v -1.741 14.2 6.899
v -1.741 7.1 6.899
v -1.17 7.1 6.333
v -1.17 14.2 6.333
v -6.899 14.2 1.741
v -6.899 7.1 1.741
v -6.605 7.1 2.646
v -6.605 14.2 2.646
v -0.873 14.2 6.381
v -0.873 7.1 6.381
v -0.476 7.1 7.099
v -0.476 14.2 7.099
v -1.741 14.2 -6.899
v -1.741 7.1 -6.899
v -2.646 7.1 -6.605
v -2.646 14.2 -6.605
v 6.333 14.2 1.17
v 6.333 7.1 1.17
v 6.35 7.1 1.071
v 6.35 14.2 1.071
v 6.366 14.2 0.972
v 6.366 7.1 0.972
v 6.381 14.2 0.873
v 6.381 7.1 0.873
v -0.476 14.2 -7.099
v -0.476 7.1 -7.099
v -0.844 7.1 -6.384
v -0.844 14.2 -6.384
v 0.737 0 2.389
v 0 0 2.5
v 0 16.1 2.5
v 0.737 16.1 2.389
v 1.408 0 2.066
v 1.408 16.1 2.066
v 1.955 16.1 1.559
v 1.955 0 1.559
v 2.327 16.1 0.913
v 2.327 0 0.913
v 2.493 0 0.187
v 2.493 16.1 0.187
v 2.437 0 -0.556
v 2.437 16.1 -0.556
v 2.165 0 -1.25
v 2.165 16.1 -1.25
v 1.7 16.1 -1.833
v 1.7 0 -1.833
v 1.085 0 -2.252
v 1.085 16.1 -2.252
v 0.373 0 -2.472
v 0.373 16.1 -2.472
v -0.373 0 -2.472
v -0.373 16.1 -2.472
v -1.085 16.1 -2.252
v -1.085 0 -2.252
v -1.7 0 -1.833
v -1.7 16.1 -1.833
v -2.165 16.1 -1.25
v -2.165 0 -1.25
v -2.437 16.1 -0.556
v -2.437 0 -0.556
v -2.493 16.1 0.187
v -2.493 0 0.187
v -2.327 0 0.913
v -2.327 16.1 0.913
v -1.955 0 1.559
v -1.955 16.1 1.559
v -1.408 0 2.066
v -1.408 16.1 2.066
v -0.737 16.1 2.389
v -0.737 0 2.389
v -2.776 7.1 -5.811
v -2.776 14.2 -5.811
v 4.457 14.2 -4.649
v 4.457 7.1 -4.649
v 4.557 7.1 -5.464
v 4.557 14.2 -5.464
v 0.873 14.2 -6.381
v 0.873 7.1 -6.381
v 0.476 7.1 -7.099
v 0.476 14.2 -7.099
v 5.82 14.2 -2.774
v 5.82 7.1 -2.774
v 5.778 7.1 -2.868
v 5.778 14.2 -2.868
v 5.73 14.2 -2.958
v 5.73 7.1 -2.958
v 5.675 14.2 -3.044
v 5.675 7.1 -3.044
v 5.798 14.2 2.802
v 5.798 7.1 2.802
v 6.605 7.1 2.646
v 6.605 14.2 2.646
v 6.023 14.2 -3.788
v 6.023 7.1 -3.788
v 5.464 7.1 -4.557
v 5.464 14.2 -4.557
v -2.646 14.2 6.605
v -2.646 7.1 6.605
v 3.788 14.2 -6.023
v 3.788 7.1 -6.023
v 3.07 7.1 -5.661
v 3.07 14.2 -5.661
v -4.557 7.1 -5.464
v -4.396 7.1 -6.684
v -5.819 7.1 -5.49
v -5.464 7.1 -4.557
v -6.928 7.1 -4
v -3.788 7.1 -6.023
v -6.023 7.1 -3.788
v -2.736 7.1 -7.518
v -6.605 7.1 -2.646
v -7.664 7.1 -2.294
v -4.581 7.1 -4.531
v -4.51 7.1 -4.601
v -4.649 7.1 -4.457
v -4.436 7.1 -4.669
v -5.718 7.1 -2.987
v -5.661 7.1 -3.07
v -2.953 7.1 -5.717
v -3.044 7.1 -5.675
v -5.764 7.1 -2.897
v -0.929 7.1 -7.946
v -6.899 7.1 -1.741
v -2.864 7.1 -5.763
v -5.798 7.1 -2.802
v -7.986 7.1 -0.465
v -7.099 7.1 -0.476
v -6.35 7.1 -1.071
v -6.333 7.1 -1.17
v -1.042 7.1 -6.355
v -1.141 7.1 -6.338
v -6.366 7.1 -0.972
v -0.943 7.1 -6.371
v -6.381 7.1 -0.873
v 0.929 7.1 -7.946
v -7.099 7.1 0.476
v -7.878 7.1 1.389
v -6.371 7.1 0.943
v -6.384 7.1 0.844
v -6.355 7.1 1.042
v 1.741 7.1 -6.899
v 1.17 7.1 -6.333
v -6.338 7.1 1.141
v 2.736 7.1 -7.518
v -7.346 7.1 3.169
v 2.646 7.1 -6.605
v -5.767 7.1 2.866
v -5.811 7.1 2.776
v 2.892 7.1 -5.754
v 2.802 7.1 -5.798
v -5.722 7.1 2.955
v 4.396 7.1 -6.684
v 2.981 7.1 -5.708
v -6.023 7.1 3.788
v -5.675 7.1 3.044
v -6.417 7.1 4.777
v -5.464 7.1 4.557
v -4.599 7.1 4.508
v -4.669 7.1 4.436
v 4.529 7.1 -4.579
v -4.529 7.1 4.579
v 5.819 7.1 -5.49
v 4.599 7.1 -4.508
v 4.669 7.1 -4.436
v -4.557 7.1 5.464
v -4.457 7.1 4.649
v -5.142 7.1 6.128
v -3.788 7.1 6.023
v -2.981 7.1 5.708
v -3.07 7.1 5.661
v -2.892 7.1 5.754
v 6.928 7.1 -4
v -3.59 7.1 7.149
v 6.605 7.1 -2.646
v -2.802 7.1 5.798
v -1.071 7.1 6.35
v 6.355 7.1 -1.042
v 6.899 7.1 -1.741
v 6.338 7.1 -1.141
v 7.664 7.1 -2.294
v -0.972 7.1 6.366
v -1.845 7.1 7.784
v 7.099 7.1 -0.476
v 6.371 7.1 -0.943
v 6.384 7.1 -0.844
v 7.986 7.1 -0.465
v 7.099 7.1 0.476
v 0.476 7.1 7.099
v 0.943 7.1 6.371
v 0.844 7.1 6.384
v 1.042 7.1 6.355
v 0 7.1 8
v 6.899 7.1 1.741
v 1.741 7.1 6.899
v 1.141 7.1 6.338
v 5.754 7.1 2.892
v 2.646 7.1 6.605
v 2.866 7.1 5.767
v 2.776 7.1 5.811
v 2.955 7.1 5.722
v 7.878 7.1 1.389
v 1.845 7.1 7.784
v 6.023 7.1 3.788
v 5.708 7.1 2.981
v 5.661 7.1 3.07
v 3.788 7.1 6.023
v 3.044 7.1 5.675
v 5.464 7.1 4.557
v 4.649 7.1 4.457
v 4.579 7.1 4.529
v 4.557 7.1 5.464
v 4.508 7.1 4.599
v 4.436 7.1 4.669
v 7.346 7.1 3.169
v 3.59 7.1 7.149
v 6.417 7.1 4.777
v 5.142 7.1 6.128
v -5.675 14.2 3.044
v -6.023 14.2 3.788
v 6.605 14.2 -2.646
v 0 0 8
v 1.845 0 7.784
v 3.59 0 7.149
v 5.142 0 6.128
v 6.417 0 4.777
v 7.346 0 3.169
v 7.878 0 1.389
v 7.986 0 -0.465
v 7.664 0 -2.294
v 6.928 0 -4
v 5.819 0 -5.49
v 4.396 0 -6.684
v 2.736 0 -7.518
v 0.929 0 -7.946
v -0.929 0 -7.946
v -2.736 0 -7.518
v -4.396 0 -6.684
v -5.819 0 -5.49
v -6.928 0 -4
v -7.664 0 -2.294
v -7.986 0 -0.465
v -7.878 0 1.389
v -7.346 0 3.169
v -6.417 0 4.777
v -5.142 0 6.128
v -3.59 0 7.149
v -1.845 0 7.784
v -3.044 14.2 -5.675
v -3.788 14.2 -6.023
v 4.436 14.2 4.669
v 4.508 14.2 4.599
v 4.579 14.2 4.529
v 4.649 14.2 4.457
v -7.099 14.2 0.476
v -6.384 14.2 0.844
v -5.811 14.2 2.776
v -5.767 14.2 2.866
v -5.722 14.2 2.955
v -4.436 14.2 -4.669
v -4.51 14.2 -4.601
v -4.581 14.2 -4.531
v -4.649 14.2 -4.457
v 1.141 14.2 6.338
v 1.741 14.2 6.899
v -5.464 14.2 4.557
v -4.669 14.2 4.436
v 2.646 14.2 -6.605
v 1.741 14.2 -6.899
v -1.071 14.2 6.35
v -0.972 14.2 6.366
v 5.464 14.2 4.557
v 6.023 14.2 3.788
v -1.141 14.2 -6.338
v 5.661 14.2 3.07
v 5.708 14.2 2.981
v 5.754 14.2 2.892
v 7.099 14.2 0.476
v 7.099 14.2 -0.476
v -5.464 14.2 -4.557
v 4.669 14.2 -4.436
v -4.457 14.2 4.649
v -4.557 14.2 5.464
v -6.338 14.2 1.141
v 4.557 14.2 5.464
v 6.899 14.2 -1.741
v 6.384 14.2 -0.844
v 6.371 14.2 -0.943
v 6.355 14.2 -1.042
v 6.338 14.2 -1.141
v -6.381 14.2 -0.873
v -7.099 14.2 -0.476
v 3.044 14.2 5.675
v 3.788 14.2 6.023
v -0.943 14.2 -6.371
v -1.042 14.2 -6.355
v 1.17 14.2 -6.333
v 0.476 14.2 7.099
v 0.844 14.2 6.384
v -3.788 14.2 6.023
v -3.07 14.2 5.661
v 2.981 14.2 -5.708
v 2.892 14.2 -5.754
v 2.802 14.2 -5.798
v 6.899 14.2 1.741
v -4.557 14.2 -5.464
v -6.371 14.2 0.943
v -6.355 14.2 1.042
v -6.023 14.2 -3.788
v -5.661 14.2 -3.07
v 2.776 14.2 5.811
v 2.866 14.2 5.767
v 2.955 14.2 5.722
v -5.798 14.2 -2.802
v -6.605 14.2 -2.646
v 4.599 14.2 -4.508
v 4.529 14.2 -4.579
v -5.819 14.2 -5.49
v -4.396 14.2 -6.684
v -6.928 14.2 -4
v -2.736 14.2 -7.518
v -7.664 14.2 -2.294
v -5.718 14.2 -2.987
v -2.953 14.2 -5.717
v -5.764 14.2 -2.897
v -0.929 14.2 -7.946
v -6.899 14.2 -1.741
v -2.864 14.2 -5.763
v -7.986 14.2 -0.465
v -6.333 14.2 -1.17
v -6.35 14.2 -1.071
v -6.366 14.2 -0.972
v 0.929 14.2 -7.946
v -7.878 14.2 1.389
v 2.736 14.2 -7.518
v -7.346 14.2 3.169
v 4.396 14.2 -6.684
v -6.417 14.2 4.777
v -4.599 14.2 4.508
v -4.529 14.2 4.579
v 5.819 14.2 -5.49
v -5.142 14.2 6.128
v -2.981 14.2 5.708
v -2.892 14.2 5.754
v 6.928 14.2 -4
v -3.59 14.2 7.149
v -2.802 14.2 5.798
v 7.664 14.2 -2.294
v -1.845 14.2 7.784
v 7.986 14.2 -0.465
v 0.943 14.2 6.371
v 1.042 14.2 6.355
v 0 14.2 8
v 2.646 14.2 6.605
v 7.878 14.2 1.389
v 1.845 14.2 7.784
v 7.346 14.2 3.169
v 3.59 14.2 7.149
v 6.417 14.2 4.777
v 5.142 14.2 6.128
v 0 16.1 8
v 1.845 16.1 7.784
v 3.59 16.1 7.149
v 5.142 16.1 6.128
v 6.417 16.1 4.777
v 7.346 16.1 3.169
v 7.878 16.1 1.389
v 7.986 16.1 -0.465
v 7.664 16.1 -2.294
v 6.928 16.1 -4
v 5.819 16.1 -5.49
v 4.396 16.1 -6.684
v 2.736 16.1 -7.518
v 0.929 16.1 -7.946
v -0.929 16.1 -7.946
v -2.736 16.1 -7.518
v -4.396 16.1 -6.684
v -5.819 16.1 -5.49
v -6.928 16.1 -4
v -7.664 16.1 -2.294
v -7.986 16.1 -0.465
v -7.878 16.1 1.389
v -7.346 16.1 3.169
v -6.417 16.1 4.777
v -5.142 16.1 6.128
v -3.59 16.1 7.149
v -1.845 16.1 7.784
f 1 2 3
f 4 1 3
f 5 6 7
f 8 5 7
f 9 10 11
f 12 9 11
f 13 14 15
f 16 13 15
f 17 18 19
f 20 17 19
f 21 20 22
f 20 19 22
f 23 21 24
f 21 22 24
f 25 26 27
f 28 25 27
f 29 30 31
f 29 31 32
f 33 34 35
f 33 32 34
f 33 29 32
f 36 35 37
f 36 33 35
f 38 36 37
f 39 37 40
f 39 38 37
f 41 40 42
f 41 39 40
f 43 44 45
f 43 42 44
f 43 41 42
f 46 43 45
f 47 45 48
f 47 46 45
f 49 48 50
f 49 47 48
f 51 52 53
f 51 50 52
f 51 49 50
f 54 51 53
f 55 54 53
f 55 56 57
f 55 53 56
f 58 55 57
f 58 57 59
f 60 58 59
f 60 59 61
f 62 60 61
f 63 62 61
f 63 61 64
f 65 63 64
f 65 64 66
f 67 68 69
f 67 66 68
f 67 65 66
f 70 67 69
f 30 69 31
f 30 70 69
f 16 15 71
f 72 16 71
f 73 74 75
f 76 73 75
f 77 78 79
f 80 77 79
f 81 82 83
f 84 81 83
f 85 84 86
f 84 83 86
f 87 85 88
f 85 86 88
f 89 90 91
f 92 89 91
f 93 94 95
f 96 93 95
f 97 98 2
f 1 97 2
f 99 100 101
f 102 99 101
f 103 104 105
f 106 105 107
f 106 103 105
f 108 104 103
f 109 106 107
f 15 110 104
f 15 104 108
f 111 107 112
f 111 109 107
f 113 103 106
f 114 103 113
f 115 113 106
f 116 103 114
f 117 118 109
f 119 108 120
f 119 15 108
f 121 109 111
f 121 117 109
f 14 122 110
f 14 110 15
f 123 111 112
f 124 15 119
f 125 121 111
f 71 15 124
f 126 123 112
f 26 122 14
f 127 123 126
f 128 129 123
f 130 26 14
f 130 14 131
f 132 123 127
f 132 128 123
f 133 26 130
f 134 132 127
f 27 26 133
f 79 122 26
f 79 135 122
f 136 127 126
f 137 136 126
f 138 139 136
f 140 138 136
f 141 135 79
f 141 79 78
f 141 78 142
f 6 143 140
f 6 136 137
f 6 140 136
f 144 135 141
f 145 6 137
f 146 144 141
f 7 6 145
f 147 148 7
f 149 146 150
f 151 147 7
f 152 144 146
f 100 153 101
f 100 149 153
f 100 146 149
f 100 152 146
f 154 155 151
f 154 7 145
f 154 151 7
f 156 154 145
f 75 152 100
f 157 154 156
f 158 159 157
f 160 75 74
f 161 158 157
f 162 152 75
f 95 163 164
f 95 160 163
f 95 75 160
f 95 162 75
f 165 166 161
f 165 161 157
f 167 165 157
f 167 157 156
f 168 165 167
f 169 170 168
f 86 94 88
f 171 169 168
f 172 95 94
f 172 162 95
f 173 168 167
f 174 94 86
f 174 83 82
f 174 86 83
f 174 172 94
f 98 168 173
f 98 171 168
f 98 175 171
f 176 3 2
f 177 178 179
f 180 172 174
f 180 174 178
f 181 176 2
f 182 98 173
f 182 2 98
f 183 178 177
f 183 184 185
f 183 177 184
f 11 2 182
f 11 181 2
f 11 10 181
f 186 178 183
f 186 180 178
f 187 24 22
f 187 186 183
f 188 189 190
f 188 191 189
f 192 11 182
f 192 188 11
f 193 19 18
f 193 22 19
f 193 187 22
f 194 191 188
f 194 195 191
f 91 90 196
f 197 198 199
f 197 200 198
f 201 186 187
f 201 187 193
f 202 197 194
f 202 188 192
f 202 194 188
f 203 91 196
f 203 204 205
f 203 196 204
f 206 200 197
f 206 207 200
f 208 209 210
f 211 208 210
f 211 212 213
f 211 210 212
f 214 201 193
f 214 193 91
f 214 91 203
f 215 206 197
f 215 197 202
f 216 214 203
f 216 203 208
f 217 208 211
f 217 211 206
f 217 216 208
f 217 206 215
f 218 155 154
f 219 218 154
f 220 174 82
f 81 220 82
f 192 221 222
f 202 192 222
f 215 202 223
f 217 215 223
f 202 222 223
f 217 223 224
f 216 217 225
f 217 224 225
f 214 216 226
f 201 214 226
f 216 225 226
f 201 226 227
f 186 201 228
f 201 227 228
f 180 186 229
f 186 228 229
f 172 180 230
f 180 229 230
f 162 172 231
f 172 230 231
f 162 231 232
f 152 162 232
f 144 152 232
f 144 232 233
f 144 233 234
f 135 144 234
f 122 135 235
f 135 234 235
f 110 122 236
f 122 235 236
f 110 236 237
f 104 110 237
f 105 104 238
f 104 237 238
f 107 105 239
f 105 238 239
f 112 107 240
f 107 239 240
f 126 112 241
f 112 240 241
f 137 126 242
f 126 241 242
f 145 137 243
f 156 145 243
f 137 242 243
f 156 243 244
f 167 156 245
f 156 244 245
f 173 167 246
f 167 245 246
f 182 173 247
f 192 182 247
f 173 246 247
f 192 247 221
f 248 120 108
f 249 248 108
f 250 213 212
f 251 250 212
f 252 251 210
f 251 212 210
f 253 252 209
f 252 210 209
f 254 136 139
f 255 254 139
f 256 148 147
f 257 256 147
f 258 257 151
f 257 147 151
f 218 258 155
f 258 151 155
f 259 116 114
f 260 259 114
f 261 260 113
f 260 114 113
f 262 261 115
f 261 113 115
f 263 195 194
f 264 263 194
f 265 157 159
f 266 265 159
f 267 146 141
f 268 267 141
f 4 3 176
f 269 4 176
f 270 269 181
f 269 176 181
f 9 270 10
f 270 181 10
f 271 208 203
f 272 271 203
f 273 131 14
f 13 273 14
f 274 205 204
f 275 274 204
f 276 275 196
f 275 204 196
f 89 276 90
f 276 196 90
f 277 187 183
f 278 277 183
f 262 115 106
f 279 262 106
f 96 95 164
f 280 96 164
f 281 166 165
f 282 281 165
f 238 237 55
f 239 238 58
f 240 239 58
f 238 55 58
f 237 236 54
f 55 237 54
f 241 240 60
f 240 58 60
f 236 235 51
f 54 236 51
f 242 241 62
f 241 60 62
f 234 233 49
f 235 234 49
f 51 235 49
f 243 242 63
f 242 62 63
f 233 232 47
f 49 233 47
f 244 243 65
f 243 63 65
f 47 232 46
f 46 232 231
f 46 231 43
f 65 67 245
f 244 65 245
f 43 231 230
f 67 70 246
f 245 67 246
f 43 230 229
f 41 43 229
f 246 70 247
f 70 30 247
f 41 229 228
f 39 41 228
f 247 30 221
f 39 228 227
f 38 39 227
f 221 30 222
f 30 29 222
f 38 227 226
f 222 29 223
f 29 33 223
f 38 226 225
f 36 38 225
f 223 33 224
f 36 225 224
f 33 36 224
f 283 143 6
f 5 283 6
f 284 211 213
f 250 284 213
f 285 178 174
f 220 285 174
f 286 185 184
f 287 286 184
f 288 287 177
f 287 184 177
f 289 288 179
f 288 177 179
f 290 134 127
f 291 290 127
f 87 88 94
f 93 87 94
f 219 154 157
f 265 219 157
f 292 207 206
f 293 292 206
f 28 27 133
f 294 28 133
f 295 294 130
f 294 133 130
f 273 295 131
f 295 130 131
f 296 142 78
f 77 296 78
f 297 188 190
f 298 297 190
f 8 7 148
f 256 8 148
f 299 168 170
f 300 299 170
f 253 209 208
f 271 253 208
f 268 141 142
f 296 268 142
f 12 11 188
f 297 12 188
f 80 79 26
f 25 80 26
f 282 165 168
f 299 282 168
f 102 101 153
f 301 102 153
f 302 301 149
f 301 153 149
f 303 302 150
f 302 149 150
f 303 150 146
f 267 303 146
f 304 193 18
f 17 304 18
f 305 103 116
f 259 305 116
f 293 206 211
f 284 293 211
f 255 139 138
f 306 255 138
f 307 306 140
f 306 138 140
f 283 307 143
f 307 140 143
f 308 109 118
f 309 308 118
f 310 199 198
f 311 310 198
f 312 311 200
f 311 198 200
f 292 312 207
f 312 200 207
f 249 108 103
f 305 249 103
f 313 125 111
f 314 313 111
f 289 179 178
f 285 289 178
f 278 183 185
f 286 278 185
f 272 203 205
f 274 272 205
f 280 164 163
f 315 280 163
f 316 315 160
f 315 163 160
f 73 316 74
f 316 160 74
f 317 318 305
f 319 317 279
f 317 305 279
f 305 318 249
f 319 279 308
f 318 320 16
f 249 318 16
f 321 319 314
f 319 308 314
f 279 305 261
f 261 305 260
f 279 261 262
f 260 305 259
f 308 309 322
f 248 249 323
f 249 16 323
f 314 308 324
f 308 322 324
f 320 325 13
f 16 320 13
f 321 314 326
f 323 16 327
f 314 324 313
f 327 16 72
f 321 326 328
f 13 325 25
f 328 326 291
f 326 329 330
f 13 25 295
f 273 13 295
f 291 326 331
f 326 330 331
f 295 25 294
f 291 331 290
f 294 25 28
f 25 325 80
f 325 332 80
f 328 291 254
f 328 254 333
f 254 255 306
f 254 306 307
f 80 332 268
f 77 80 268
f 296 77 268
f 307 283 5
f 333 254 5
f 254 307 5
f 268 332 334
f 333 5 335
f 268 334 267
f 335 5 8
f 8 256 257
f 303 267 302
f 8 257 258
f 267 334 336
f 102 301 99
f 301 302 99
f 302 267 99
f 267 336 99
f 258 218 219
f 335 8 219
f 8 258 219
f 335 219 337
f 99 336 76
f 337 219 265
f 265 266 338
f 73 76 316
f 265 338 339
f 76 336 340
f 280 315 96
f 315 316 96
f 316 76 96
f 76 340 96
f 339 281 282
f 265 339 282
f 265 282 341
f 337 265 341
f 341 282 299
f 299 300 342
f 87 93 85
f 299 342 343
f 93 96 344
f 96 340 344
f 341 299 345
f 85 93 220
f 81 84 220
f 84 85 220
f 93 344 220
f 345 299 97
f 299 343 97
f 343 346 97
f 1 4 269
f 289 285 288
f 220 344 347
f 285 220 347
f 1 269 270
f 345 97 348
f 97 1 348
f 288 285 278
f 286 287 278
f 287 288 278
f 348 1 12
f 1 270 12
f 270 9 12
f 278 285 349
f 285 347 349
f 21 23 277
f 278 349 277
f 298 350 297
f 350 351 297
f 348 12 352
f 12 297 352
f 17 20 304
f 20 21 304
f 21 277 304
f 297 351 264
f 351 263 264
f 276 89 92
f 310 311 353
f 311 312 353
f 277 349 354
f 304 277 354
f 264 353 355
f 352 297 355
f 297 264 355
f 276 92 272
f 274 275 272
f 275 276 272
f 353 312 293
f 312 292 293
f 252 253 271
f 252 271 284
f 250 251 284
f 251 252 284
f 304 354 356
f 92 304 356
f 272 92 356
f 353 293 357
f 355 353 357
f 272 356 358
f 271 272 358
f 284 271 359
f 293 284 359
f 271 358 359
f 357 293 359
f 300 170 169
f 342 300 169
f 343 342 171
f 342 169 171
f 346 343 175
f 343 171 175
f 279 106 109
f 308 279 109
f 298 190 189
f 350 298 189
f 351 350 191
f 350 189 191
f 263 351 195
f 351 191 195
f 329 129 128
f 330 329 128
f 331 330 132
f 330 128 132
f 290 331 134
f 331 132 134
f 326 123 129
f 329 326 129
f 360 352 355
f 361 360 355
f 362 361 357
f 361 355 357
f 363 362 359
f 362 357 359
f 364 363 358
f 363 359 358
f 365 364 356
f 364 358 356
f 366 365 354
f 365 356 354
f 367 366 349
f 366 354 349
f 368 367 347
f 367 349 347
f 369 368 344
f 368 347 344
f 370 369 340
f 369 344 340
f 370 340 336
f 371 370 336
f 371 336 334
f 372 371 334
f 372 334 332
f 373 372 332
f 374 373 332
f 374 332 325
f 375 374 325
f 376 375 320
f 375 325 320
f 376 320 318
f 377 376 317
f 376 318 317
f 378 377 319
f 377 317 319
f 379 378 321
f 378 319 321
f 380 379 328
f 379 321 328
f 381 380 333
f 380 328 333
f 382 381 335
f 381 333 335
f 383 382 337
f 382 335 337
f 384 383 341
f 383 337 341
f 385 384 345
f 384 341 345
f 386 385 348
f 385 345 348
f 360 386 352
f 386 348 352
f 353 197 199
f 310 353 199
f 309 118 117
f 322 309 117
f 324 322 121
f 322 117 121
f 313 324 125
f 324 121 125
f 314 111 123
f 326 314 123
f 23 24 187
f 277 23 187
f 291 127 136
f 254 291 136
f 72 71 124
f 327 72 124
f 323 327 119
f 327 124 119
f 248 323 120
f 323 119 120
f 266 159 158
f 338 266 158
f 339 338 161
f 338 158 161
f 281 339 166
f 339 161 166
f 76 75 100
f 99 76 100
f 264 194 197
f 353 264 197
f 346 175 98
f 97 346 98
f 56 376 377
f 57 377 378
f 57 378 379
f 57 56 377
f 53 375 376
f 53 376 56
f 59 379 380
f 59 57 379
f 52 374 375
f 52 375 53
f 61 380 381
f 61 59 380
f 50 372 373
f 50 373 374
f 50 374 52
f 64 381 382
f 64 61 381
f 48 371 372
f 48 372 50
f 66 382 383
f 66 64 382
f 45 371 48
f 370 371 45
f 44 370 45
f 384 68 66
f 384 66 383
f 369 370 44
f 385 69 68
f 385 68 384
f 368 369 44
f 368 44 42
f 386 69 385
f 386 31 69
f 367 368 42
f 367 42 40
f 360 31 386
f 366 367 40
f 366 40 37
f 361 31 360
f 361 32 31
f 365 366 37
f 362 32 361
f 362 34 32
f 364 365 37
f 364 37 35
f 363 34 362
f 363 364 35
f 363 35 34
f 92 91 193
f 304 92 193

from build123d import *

# Parameters (mm, degrees)
SKETCH1_R               = 8
BOSS_EXTRUDE1_DEPTH     = 7.1
BOSS_EXTRUDE2_DEPTH     = 7.1
SKETCH3_R               = 8
BOSS_EXTRUDE3_DEPTH     = 1.9
CUT_EXTRUDE1_DEPTH      = 20.677652299
CUT_EXTRUDE1_DEPTH_BACK = 20.677652299
SKETCH4_R               = 2.5


with BuildPart() as part:
    # Sketch1 → Boss-Extrude1 (new body)
    with BuildSketch(Plane(origin=(0, 0, 0), x_dir=(1, 0, 0), z_dir=(0, 1, 0))):
        with Locations(Location((0, 0, 0), (0, 0, 270))):
            Circle(SKETCH1_R)
    extrude(amount=BOSS_EXTRUDE1_DEPTH)

    # Sketch2 → Boss-Extrude2 (add)
    with BuildSketch(Plane(origin=(0, 7.1, 0), x_dir=(1, 0, 0), z_dir=(0, 1, 0))):
        with BuildLine():
            Line((-0.475669396, 7.098967945), (-0.844267822, 6.384436135))
            ThreePointArc((-0.844267822, 6.384436135), (-0.992920102, 6.363012069), (-1.14103236, 6.338127332))
            Line((-1.14103236, 6.338127332), (-1.741313259, 6.89850965))
            Line((-1.741313259, 6.89850965), (-2.646090217, 6.604529796))
            Line((-2.646090217, 6.604529796), (-2.775845679, 5.811066484))
            ThreePointArc((-2.775845679, 5.811066484), (-2.90801175, 5.739642443), (-3.043775319, 5.675318909))
            Line((-3.043775319, 5.675318909), (-3.78784404, 6.022777166))
            Line((-3.78784404, 6.022777166), (-4.55749329, 5.463594254))
            Line((-4.55749329, 5.463594254), (-4.43570442, 4.668869158))
            ThreePointArc((-4.43570442, 4.668869158), (-4.545755036, 4.566553145), (-4.648572343, 4.45697073))
            Line((-4.648572343, 4.45697073), (-5.463594254, 4.557493289))
            Line((-5.463594254, 4.557493289), (-6.022777166, 3.787844039))
            Line((-6.022777166, 3.787844039), (-5.661365507, 3.069650389))
            ThreePointArc((-5.661365507, 3.069650389), (-5.74260171, 2.942530762), (-5.798334717, 2.802343202))
            Line((-5.798334717, 2.802343202), (-6.604529796, 2.646090216))
            Line((-6.604529796, 2.646090216), (-6.89850965, 1.741313258))
            Line((-6.89850965, 1.741313258), (-6.332852694, 1.169952852))
            ThreePointArc((-6.332852694, 1.169952852), (-6.358413277, 1.021955731), (-6.38051569, 0.873402797))
            Line((-6.38051569, 0.873402797), (-7.098967945, 0.475669396))
            Line((-7.098967945, 0.475669396), (-7.098967945, -0.475669396))
            Line((-7.098967945, -0.475669396), (-6.384436135, -0.844267822))
            ThreePointArc((-6.384436135, -0.844267822), (-6.363012069, -0.992920102), (-6.338127332, -1.14103236))
            Line((-6.338127332, -1.14103236), (-6.89850965, -1.741313259))
            Line((-6.89850965, -1.741313259), (-6.604529796, -2.646090217))
            Line((-6.604529796, -2.646090217), (-5.811066484, -2.775845679))
            ThreePointArc((-5.811066484, -2.775845679), (-5.744754906, -2.910601998), (-5.675318909, -3.043775319))
            Line((-5.675318909, -3.043775319), (-6.022777166, -3.78784404))
            Line((-6.022777166, -3.78784404), (-5.463594254, -4.55749329))
            Line((-5.463594254, -4.55749329), (-4.668869158, -4.43570442))
            ThreePointArc((-4.668869158, -4.43570442), (-4.564161106, -4.543373891), (-4.45697073, -4.648572343))
            Line((-4.45697073, -4.648572343), (-4.557493289, -5.463594254))
            Line((-4.557493289, -5.463594254), (-3.787844039, -6.022777166))
            Line((-3.787844039, -6.022777166), (-3.069650389, -5.661365507))
            ThreePointArc((-3.069650389, -5.661365507), (-2.936795417, -5.731408691), (-2.802343202, -5.798334717))
            Line((-2.802343202, -5.798334717), (-2.646090216, -6.604529796))
            Line((-2.646090216, -6.604529796), (-1.741313258, -6.89850965))
            Line((-1.741313258, -6.89850965), (-1.169952852, -6.332852694))
            ThreePointArc((-1.169952852, -6.332852694), (-1.021955731, -6.358413277), (-0.873402797, -6.38051569))
            Line((-0.873402797, -6.38051569), (-0.475669396, -7.098967945))
            Line((-0.475669396, -7.098967945), (0.475669396, -7.098967945))
            Line((0.475669396, -7.098967945), (0.844267822, -6.384436135))
            ThreePointArc((0.844267822, -6.384436135), (0.992920102, -6.363012069), (1.14103236, -6.338127332))
            Line((1.14103236, -6.338127332), (1.741313259, -6.89850965))
            Line((1.741313259, -6.89850965), (2.646090217, -6.604529796))
            Line((2.646090217, -6.604529796), (2.775845679, -5.811066484))
            ThreePointArc((2.775845679, -5.811066484), (2.910601998, -5.744754906), (3.043775319, -5.675318909))
            Line((3.043775319, -5.675318909), (3.78784404, -6.022777166))
            Line((3.78784404, -6.022777166), (4.55749329, -5.463594254))
            Line((4.55749329, -5.463594254), (4.43570442, -4.668869158))
            ThreePointArc((4.43570442, -4.668869158), (4.543373891, -4.564161106), (4.648572343, -4.45697073))
            Line((4.648572343, -4.45697073), (5.463594254, -4.557493289))
            Line((5.463594254, -4.557493289), (6.022777166, -3.787844039))
            Line((6.022777166, -3.787844039), (5.661365507, -3.069650389))
            ThreePointArc((5.661365507, -3.069650389), (5.73140869, -2.936795416), (5.798334717, -2.802343202))
            Line((5.798334717, -2.802343202), (6.604529796, -2.646090216))
            Line((6.604529796, -2.646090216), (6.89850965, -1.741313258))
            Line((6.89850965, -1.741313258), (6.332852694, -1.169952852))
            ThreePointArc((6.332852694, -1.169952852), (6.358413277, -1.021955731), (6.38051569, -0.873402797))
            Line((6.38051569, -0.873402797), (7.098967945, -0.475669396))
            Line((7.098967945, -0.475669396), (7.098967945, 0.475669396))
            Line((7.098967945, 0.475669396), (6.384436135, 0.844267822))
            ThreePointArc((6.384436135, 0.844267822), (6.363012069, 0.992920102), (6.338127332, 1.14103236))
            Line((6.338127332, 1.14103236), (6.89850965, 1.741313259))
            Line((6.89850965, 1.741313259), (6.604529796, 2.646090217))
            Line((6.604529796, 2.646090217), (5.819778459, 2.774421005))
            ThreePointArc((5.819778459, 2.774421005), (5.755101615, 2.913148935), (5.675318909, 3.043775319))
            Line((5.675318909, 3.043775319), (6.022777166, 3.78784404))
            Line((6.022777166, 3.78784404), (5.463594254, 4.55749329))
            Line((5.463594254, 4.55749329), (4.668869158, 4.43570442))
            ThreePointArc((4.668869158, 4.43570442), (4.564161105, 4.54337389), (4.45697073, 4.648572343))
            Line((4.45697073, 4.648572343), (4.557493289, 5.463594254))
            Line((4.557493289, 5.463594254), (3.787844039, 6.022777166))
            Line((3.787844039, 6.022777166), (3.069650389, 5.661365507))
            ThreePointArc((3.069650389, 5.661365507), (2.936795417, 5.731408691), (2.802343202, 5.798334717))
            Line((2.802343202, 5.798334717), (2.646090216, 6.604529796))
            Line((2.646090216, 6.604529796), (1.741313258, 6.89850965))
            Line((1.741313258, 6.89850965), (1.169952852, 6.332852694))
            Line((1.169952852, 6.332852694), (0.873402797, 6.38051569))
            Line((0.873402797, 6.38051569), (0.475669396, 7.098967945))
            Line((0.475669396, 7.098967945), (-0.475669396, 7.098967945))
        make_face()
    extrude(amount=BOSS_EXTRUDE2_DEPTH)

    # Sketch3 → Boss-Extrude3 (add)
    with BuildSketch(Plane(origin=(0, 14.2, 0), x_dir=(1, 0, 0), z_dir=(0, 1, 0))):
        with Locations(Location((0, 0, 0), (0, 0, 270))):
            Circle(SKETCH3_R)
    extrude(amount=BOSS_EXTRUDE3_DEPTH)

    # Sketch4 → Cut-Extrude1 (cut, two sides: drawn at the far end of the back side and taken through both)
    with BuildSketch(Plane(origin=(0, 16.1, 0), x_dir=(1, 0, 0), z_dir=(0, 1, 0)).offset(-CUT_EXTRUDE1_DEPTH_BACK)):
        with Locations(Location((0, 0, 0), (0, 0, 270))):
            Circle(SKETCH4_R)
    extrude(amount=CUT_EXTRUDE1_DEPTH + CUT_EXTRUDE1_DEPTH_BACK, mode=Mode.SUBTRACT)


solid = part.part
